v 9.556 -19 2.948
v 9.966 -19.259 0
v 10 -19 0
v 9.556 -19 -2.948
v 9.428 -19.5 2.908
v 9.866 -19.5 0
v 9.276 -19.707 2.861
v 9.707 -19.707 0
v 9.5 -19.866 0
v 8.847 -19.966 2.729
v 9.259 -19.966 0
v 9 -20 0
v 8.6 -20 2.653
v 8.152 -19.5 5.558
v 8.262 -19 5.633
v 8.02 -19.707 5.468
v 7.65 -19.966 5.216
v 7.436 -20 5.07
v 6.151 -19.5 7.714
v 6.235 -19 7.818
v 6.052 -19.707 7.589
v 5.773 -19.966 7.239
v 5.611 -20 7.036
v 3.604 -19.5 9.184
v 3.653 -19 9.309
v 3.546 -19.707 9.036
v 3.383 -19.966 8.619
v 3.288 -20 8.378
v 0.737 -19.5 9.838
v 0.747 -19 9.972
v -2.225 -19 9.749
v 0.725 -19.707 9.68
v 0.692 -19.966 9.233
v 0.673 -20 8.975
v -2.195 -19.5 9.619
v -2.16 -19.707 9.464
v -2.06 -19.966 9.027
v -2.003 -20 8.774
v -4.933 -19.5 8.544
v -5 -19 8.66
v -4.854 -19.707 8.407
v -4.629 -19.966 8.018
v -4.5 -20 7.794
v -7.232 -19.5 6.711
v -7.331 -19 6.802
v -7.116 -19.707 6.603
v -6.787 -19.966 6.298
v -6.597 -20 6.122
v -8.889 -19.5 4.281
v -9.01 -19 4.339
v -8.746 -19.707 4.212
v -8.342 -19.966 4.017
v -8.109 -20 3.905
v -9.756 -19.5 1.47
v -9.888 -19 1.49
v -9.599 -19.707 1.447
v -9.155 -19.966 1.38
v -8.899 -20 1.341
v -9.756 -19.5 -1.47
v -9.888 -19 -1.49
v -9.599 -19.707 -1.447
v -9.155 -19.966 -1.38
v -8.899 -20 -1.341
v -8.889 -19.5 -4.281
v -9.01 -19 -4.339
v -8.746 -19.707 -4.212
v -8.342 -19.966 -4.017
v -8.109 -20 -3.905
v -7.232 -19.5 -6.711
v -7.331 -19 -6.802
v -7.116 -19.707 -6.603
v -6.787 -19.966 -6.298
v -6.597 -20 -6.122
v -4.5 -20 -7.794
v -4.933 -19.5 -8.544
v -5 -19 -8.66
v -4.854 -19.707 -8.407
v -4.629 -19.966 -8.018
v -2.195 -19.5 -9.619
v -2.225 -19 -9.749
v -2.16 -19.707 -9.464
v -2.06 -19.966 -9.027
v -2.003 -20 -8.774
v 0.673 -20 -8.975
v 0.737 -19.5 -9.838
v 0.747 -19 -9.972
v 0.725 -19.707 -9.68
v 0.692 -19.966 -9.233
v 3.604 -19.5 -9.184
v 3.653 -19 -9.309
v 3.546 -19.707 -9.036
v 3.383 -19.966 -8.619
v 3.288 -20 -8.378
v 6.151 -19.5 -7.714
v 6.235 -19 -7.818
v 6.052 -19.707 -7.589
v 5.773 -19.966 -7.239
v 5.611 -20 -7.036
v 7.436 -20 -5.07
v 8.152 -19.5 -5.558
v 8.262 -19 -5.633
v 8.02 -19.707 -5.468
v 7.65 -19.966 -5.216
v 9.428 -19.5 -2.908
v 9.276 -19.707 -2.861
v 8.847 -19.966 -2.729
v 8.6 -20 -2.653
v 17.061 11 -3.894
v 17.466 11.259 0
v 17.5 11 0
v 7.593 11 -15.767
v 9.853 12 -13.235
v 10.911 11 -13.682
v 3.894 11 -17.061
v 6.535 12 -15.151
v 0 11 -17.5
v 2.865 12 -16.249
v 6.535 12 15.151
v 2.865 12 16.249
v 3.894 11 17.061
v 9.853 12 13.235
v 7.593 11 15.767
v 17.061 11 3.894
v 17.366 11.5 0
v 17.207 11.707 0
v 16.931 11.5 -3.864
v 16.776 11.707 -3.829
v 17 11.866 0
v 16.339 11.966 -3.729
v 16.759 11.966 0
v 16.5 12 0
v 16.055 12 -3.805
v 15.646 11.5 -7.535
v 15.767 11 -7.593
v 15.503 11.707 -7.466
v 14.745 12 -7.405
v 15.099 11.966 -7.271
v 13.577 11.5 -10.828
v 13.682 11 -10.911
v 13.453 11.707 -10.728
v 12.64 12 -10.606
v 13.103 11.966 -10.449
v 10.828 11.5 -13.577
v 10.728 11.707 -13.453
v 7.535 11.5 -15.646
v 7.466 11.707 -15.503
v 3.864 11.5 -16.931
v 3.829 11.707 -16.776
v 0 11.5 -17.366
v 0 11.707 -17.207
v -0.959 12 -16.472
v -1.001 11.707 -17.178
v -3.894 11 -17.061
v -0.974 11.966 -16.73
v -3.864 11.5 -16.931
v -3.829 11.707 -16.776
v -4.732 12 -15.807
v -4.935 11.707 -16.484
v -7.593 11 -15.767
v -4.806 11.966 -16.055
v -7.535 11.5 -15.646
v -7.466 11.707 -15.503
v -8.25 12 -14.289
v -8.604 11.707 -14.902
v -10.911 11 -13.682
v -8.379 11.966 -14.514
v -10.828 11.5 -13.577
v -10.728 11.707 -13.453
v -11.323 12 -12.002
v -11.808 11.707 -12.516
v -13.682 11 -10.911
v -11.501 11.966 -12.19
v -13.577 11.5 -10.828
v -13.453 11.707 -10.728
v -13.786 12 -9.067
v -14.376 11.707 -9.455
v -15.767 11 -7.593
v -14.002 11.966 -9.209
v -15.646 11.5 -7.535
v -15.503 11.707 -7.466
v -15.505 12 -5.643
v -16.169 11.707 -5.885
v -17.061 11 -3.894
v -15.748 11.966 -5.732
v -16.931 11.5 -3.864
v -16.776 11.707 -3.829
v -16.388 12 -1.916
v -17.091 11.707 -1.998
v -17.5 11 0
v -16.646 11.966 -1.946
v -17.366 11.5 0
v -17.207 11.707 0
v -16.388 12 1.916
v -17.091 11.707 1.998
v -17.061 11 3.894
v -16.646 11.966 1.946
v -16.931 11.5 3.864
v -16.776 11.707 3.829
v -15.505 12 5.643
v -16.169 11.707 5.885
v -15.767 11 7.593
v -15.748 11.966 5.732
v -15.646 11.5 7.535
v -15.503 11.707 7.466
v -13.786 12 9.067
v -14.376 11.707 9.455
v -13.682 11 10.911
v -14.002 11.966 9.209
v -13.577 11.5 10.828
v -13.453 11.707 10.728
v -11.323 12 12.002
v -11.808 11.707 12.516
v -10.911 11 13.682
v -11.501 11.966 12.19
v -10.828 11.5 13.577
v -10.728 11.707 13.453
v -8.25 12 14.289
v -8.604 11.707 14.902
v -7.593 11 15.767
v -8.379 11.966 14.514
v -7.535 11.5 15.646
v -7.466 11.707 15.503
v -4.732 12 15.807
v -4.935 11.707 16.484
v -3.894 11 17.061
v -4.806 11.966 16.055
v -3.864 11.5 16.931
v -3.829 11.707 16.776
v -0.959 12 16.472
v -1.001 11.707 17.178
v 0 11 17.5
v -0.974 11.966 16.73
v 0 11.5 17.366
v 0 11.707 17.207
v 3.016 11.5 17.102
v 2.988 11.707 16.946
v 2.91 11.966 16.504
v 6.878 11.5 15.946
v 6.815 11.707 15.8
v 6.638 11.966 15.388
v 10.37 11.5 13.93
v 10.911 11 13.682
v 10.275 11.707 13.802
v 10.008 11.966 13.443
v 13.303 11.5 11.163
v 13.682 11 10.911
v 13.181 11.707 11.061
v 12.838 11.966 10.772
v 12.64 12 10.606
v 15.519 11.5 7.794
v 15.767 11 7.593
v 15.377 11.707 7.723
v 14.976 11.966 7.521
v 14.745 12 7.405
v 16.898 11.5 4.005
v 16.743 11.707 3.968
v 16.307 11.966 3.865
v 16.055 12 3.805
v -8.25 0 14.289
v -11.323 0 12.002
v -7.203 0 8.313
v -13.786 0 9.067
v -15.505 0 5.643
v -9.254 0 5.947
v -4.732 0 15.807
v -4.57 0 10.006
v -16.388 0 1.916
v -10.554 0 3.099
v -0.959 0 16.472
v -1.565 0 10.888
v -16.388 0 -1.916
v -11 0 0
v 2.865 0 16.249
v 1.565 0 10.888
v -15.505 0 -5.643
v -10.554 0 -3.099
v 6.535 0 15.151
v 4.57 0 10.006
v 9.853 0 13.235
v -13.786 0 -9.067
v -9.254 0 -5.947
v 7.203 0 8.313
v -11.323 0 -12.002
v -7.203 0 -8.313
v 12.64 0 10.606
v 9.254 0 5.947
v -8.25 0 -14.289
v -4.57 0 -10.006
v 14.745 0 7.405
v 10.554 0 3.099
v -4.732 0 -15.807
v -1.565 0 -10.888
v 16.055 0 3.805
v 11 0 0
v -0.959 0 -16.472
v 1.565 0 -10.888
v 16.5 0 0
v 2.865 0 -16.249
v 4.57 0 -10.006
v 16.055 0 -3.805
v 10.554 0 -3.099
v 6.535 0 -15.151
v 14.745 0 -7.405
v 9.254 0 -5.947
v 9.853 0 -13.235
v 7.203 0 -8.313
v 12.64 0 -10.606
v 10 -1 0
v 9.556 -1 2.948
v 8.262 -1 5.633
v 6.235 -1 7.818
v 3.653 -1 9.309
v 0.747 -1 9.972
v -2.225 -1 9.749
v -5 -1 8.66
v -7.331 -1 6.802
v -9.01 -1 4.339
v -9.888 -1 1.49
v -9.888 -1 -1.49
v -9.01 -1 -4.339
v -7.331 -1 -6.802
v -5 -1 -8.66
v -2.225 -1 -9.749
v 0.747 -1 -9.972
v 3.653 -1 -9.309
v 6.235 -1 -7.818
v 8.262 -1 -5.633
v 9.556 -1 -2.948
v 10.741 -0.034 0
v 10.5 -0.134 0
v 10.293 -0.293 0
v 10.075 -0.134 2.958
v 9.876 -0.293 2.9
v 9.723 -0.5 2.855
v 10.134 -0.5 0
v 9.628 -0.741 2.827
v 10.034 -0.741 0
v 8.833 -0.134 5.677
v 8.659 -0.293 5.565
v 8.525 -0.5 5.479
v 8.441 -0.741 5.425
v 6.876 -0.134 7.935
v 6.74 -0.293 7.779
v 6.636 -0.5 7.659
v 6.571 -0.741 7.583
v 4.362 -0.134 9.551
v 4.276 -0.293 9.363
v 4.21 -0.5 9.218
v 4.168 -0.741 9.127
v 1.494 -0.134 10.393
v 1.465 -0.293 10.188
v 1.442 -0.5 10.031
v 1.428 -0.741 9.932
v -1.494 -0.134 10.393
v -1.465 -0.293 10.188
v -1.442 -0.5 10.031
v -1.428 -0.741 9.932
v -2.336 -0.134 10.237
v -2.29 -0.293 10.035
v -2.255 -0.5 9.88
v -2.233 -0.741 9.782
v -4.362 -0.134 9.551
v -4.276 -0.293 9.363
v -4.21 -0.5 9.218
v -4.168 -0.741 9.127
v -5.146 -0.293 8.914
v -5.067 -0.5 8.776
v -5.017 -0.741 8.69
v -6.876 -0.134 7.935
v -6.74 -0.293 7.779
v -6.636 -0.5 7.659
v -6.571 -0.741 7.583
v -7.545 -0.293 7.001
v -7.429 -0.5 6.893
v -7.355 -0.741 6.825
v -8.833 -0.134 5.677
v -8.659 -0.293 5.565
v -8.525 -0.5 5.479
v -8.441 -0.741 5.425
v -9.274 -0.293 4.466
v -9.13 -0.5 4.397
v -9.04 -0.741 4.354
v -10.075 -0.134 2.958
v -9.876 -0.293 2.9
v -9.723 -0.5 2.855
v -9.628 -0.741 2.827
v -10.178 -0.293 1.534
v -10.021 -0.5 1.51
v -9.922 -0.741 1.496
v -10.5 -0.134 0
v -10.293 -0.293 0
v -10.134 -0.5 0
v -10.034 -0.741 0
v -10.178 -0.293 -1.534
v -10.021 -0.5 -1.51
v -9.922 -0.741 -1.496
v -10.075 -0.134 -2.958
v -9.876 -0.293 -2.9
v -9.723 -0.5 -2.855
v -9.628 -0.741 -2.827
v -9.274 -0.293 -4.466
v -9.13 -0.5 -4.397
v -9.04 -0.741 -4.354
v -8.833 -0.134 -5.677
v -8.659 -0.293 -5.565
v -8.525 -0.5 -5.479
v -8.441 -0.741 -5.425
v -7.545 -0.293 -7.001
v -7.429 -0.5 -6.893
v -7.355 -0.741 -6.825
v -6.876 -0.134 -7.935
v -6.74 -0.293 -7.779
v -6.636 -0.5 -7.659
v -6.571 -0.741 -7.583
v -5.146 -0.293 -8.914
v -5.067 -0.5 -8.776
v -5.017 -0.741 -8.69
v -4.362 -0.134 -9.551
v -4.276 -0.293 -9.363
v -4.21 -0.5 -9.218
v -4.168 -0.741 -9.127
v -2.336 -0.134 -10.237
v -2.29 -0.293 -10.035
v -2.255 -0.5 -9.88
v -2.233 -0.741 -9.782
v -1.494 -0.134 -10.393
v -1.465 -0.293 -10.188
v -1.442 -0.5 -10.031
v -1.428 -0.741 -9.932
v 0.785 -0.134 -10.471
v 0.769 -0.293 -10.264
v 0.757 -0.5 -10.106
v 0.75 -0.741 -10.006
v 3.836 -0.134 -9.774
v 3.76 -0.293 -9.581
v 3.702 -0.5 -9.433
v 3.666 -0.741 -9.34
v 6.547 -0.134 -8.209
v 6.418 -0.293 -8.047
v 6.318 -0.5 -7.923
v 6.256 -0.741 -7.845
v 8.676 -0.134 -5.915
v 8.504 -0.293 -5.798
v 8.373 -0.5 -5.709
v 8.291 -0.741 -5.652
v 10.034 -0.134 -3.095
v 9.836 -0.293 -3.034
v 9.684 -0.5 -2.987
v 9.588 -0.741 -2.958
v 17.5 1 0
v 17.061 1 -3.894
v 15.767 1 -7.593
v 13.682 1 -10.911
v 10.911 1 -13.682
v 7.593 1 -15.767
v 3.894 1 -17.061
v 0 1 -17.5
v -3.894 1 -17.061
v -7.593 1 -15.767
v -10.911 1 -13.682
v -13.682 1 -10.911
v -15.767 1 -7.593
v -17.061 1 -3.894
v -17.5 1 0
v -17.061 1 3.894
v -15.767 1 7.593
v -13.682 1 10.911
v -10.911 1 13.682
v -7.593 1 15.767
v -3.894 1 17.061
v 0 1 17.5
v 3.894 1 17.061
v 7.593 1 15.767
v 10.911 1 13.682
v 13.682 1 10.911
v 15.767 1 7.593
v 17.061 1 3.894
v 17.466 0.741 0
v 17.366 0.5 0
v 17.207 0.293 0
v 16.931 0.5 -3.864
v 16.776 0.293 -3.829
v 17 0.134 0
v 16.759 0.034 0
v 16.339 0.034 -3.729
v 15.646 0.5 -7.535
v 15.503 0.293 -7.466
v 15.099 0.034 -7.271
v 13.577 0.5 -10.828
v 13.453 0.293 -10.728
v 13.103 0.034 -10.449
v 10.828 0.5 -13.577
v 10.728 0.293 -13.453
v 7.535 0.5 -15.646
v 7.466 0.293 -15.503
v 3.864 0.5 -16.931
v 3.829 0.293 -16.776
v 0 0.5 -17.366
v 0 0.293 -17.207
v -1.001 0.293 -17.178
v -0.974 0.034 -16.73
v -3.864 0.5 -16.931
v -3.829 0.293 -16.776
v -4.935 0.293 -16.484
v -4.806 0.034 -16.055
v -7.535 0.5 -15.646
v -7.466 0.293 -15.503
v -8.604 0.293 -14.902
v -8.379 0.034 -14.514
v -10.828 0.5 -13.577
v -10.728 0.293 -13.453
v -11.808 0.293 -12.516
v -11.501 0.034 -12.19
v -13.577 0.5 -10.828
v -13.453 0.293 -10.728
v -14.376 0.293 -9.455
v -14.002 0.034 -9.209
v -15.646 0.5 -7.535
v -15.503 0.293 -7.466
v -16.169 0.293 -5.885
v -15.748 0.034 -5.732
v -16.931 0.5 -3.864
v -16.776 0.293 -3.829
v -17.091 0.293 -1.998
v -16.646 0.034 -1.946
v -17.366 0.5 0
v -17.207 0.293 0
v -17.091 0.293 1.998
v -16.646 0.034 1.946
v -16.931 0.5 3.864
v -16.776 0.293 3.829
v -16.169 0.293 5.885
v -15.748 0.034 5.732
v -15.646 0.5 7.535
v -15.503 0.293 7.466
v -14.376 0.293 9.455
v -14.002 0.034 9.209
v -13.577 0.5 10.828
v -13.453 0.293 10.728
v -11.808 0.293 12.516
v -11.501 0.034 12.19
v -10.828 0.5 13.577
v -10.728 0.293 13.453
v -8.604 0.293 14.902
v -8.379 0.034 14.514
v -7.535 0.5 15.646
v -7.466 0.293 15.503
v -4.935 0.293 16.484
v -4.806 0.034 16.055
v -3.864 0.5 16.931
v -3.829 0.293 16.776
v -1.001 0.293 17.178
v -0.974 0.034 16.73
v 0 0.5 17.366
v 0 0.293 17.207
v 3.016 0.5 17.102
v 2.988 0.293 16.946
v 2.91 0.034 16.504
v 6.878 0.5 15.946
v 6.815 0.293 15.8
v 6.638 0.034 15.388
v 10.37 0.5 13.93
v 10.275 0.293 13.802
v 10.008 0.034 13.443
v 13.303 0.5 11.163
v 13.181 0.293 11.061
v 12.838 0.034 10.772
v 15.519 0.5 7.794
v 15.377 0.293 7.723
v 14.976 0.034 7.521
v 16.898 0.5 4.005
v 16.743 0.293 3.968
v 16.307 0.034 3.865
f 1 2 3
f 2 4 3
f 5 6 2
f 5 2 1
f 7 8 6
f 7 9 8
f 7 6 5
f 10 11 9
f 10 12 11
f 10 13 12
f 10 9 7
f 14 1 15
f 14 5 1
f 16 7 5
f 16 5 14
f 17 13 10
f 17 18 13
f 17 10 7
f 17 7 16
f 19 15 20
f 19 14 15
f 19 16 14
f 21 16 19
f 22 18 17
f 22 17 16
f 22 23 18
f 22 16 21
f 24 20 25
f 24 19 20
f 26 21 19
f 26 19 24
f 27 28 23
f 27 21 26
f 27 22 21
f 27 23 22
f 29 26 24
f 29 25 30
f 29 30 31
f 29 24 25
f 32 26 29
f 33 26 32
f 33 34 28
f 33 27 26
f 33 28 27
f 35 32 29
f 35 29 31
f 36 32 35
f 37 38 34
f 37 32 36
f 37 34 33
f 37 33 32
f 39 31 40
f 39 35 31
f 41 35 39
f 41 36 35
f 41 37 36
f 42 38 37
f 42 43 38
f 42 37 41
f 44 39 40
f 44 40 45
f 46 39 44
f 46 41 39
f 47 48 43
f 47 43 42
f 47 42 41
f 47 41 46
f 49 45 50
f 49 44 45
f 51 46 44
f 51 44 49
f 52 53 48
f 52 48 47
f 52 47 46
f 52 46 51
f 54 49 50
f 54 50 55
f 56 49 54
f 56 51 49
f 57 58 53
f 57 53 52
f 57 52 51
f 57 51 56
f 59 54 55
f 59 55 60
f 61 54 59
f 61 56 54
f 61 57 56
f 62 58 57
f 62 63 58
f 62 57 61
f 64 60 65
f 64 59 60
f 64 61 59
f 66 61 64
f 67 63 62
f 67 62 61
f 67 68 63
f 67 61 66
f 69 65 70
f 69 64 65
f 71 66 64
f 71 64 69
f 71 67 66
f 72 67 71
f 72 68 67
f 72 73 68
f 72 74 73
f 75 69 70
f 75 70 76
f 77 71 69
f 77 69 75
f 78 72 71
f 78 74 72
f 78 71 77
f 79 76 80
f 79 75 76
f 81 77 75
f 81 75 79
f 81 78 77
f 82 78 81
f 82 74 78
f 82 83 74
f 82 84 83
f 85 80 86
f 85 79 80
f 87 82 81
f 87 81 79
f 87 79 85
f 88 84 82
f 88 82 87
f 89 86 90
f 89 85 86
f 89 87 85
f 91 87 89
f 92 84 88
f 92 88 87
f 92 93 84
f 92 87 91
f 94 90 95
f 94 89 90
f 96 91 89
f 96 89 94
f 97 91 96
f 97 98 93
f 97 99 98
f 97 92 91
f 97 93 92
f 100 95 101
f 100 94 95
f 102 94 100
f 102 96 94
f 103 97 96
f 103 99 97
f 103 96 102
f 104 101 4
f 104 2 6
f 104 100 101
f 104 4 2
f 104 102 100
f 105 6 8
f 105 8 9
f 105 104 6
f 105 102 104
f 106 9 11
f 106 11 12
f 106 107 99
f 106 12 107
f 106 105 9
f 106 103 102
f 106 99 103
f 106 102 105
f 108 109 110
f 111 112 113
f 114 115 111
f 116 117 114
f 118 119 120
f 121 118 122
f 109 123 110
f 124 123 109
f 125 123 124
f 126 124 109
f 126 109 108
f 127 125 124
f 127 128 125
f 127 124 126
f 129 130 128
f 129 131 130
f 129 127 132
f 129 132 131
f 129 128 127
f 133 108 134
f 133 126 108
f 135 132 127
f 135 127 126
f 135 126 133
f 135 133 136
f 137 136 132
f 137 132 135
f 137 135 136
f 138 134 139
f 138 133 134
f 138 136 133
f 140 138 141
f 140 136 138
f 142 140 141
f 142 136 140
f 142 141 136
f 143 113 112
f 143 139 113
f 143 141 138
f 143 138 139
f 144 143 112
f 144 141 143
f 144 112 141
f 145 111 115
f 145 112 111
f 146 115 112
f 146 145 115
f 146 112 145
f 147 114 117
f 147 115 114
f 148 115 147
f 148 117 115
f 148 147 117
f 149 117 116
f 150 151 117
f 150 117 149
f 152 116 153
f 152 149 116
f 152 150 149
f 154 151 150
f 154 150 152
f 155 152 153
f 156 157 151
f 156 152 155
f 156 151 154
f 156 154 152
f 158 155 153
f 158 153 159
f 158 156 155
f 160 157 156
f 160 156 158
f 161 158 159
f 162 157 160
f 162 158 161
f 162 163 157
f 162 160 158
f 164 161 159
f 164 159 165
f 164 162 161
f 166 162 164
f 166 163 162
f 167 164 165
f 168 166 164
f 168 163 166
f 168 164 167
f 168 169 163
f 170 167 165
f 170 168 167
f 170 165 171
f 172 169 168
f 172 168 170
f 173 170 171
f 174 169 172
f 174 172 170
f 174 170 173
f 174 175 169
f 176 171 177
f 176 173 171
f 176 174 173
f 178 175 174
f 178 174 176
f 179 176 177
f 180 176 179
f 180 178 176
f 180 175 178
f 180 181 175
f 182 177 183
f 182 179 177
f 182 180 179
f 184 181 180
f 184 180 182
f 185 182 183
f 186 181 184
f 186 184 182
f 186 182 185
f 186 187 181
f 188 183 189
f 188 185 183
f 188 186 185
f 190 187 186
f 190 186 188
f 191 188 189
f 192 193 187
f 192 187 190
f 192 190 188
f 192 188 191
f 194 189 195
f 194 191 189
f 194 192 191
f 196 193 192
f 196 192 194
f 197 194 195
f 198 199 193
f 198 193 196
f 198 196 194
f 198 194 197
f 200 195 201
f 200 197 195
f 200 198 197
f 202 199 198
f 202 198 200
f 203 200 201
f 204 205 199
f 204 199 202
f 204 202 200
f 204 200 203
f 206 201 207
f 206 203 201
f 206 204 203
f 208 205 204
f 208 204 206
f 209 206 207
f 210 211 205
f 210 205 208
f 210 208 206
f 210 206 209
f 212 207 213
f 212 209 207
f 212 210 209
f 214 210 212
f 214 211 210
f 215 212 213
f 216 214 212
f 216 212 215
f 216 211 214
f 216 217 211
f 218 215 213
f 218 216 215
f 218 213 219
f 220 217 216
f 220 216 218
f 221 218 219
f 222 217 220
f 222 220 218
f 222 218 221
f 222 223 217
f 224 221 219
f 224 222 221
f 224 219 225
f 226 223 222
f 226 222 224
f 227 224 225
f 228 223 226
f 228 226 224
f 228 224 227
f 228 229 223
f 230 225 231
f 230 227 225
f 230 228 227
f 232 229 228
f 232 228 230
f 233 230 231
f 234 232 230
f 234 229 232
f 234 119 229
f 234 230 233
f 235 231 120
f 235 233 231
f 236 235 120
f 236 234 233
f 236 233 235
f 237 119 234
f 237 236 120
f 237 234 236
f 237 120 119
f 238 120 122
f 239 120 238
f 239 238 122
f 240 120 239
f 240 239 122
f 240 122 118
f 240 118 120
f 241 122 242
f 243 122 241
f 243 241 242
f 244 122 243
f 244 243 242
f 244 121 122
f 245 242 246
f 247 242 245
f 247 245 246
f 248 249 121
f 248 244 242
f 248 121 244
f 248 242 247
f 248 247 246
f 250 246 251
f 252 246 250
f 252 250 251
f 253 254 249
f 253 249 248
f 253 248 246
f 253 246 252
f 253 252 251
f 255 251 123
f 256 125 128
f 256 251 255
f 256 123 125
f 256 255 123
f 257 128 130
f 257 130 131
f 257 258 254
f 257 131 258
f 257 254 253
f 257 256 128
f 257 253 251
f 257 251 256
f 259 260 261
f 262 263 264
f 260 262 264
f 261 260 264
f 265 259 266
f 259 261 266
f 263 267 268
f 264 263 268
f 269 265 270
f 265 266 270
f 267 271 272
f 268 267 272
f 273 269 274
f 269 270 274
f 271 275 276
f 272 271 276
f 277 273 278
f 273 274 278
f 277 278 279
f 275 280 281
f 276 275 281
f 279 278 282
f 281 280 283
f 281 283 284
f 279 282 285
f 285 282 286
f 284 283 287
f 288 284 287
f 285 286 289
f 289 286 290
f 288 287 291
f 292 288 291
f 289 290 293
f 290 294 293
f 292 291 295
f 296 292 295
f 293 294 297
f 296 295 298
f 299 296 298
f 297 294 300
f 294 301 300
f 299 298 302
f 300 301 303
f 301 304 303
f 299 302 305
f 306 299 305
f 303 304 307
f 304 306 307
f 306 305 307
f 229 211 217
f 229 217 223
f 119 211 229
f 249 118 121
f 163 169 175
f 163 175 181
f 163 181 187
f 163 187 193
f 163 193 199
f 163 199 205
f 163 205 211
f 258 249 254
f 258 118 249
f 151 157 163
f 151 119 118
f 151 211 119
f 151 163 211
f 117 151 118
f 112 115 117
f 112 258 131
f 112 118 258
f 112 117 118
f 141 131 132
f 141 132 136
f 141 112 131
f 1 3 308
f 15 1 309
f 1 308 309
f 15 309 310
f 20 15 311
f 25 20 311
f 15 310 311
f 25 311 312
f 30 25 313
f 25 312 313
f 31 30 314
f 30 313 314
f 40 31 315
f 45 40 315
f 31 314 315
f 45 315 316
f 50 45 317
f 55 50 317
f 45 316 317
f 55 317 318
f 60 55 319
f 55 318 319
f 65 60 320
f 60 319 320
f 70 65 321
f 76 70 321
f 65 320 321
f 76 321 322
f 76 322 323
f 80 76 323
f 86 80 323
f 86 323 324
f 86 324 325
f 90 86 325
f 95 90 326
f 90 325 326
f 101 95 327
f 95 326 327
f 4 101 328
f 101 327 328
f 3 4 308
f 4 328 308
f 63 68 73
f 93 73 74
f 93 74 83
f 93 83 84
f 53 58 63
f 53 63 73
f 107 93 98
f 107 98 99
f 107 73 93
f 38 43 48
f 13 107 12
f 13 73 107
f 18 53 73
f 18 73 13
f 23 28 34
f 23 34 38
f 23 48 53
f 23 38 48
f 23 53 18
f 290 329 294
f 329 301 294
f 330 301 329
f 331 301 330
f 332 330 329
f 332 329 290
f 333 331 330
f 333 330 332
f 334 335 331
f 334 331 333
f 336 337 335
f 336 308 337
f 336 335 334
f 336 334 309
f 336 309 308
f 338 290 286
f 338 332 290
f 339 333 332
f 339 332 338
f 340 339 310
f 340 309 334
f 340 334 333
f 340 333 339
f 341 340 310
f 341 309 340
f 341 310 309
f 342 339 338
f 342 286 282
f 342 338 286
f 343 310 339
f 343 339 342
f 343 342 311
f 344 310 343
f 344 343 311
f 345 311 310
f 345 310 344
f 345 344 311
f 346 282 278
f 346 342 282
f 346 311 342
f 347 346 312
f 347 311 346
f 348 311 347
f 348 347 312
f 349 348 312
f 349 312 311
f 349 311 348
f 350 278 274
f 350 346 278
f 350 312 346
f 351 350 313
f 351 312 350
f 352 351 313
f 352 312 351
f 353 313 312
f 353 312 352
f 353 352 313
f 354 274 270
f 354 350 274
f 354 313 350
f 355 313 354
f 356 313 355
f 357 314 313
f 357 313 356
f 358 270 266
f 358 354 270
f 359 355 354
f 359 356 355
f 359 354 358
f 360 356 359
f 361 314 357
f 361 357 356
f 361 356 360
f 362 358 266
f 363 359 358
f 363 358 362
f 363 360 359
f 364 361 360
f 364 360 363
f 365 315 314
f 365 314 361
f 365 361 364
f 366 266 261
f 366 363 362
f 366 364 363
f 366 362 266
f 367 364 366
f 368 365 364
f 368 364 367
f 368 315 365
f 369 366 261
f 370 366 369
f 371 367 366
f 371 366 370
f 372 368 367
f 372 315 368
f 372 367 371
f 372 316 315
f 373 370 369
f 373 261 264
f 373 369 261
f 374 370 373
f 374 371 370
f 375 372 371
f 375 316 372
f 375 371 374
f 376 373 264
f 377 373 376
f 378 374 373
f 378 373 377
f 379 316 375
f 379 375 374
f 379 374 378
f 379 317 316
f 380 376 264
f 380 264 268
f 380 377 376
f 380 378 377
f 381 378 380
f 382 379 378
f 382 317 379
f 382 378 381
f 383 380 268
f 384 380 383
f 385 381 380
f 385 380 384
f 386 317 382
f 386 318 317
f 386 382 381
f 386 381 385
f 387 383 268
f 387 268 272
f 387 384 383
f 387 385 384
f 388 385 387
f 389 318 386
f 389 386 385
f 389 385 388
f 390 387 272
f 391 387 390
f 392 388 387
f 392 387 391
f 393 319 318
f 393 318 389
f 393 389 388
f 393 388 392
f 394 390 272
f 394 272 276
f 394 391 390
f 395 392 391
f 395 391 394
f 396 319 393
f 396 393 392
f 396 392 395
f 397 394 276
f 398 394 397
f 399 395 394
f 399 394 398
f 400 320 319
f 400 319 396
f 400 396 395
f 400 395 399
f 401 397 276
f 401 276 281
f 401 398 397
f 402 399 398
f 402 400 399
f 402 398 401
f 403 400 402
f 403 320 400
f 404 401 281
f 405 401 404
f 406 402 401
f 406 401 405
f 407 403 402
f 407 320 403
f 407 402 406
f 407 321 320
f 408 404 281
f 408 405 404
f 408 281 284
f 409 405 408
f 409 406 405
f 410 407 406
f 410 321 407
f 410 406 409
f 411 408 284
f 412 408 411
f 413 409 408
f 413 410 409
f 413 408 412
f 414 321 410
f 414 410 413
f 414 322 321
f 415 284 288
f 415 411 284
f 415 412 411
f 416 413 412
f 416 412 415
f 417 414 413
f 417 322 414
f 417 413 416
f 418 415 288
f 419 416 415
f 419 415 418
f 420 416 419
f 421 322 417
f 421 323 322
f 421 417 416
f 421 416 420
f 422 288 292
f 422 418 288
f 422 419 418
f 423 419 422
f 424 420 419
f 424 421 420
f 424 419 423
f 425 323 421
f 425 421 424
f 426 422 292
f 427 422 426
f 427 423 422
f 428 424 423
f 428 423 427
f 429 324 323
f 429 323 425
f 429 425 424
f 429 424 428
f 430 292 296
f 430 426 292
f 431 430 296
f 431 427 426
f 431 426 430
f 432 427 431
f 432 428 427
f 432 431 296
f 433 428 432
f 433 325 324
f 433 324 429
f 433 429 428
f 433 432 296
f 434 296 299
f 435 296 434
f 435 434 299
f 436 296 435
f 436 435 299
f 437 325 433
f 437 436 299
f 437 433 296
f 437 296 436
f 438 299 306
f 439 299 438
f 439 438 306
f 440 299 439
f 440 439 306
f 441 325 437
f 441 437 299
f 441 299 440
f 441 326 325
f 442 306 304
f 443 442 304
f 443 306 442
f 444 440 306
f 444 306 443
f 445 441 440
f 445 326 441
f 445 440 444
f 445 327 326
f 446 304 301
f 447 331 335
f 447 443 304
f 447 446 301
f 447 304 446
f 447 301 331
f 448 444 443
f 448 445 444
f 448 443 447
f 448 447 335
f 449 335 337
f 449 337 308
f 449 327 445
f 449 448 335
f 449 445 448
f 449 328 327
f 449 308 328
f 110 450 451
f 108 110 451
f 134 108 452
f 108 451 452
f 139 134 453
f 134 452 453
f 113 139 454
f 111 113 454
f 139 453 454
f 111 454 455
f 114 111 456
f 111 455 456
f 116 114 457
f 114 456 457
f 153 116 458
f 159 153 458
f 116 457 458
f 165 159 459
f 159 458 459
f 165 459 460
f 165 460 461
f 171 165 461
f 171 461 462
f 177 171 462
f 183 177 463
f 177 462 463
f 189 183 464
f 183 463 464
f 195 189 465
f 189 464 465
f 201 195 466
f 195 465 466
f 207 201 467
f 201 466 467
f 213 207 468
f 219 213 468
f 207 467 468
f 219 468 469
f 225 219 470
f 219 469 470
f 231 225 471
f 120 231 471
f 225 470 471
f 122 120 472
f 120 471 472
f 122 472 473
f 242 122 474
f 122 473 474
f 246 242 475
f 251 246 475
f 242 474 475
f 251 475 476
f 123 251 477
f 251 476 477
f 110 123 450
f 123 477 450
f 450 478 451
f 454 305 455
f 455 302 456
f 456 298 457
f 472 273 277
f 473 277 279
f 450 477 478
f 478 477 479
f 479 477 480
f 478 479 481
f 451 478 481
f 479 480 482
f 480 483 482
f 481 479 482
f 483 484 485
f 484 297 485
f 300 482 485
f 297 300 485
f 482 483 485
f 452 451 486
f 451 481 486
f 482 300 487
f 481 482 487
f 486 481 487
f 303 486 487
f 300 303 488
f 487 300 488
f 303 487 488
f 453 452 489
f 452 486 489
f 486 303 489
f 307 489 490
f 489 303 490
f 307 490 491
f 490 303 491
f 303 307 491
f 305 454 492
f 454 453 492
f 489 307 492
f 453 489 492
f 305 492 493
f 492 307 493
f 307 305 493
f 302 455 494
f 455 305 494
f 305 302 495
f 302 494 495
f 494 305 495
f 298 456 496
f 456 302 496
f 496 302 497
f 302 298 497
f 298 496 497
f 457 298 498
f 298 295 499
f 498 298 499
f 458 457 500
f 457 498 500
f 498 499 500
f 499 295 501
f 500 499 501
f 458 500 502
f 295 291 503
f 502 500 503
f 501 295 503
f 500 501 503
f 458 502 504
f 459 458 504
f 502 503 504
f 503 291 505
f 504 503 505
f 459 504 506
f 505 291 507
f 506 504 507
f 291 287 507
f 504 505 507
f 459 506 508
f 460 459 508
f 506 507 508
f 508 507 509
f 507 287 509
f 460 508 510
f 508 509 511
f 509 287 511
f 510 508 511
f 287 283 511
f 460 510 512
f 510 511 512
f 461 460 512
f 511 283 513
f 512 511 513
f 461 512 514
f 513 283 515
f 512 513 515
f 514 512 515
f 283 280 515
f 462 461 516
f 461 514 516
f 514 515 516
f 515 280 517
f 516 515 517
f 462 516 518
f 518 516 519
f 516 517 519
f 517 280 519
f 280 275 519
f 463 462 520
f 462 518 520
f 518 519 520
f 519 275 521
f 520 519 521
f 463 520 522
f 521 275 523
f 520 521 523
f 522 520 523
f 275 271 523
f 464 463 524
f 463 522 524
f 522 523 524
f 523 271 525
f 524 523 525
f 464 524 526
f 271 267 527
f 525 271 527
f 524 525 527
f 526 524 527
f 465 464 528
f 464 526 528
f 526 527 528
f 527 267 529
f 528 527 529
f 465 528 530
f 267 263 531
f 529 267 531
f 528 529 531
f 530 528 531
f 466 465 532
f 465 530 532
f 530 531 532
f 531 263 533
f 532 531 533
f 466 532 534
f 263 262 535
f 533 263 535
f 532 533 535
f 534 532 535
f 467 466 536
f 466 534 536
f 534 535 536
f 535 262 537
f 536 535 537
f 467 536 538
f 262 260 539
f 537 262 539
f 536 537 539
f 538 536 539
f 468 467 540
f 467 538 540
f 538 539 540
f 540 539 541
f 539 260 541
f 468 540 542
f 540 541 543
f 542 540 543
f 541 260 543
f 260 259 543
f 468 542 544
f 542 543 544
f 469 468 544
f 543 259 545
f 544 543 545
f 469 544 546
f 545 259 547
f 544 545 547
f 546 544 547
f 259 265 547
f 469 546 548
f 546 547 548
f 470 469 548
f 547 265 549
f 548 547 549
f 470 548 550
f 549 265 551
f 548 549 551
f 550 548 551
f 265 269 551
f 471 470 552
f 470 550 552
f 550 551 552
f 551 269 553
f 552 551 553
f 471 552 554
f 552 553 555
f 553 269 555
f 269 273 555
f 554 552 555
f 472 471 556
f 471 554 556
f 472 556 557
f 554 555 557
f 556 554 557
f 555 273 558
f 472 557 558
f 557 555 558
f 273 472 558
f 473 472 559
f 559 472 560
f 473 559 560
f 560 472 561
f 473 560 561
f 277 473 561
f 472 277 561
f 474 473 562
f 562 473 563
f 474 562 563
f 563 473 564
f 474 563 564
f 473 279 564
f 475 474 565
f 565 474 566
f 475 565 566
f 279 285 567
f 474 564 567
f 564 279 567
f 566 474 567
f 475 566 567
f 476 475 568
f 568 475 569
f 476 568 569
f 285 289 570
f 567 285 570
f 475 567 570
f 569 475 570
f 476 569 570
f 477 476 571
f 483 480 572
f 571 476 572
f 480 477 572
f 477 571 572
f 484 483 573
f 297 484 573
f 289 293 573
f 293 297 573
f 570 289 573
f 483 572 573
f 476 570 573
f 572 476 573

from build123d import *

# Parameters (mm, degrees)
SKETCH1_R           = 17.5
BOSS_EXTRUDE1_DEPTH = 12
SKETCH2_R           = 10
BOSS_EXTRUDE2_DEPTH = 20
FILLET1_R           = 1


with BuildPart() as part:
    # Sketch1 → Boss-Extrude1 (new body)
    with BuildSketch(Plane(origin=(0, 0, 0), x_dir=(1, 0, 0), z_dir=(0, 1, 0))):
        Circle(SKETCH1_R)
    extrude(amount=BOSS_EXTRUDE1_DEPTH)

    # Sketch2 → Boss-Extrude2 (add)
    with BuildSketch(Plane.XZ):
        Circle(SKETCH2_R)
    extrude(amount=BOSS_EXTRUDE2_DEPTH)

    # Fillet1
    fillet1_edges = [part.edges().sort_by_distance(p)[0] for p in [
        (-17.5, 0, 0),
        (-17.5, 12, 0),
        (-10, 0, 0),
        (-10, -20, 0),
    ]]
    fillet(fillet1_edges, radius=FILLET1_R)


solid = part.part
